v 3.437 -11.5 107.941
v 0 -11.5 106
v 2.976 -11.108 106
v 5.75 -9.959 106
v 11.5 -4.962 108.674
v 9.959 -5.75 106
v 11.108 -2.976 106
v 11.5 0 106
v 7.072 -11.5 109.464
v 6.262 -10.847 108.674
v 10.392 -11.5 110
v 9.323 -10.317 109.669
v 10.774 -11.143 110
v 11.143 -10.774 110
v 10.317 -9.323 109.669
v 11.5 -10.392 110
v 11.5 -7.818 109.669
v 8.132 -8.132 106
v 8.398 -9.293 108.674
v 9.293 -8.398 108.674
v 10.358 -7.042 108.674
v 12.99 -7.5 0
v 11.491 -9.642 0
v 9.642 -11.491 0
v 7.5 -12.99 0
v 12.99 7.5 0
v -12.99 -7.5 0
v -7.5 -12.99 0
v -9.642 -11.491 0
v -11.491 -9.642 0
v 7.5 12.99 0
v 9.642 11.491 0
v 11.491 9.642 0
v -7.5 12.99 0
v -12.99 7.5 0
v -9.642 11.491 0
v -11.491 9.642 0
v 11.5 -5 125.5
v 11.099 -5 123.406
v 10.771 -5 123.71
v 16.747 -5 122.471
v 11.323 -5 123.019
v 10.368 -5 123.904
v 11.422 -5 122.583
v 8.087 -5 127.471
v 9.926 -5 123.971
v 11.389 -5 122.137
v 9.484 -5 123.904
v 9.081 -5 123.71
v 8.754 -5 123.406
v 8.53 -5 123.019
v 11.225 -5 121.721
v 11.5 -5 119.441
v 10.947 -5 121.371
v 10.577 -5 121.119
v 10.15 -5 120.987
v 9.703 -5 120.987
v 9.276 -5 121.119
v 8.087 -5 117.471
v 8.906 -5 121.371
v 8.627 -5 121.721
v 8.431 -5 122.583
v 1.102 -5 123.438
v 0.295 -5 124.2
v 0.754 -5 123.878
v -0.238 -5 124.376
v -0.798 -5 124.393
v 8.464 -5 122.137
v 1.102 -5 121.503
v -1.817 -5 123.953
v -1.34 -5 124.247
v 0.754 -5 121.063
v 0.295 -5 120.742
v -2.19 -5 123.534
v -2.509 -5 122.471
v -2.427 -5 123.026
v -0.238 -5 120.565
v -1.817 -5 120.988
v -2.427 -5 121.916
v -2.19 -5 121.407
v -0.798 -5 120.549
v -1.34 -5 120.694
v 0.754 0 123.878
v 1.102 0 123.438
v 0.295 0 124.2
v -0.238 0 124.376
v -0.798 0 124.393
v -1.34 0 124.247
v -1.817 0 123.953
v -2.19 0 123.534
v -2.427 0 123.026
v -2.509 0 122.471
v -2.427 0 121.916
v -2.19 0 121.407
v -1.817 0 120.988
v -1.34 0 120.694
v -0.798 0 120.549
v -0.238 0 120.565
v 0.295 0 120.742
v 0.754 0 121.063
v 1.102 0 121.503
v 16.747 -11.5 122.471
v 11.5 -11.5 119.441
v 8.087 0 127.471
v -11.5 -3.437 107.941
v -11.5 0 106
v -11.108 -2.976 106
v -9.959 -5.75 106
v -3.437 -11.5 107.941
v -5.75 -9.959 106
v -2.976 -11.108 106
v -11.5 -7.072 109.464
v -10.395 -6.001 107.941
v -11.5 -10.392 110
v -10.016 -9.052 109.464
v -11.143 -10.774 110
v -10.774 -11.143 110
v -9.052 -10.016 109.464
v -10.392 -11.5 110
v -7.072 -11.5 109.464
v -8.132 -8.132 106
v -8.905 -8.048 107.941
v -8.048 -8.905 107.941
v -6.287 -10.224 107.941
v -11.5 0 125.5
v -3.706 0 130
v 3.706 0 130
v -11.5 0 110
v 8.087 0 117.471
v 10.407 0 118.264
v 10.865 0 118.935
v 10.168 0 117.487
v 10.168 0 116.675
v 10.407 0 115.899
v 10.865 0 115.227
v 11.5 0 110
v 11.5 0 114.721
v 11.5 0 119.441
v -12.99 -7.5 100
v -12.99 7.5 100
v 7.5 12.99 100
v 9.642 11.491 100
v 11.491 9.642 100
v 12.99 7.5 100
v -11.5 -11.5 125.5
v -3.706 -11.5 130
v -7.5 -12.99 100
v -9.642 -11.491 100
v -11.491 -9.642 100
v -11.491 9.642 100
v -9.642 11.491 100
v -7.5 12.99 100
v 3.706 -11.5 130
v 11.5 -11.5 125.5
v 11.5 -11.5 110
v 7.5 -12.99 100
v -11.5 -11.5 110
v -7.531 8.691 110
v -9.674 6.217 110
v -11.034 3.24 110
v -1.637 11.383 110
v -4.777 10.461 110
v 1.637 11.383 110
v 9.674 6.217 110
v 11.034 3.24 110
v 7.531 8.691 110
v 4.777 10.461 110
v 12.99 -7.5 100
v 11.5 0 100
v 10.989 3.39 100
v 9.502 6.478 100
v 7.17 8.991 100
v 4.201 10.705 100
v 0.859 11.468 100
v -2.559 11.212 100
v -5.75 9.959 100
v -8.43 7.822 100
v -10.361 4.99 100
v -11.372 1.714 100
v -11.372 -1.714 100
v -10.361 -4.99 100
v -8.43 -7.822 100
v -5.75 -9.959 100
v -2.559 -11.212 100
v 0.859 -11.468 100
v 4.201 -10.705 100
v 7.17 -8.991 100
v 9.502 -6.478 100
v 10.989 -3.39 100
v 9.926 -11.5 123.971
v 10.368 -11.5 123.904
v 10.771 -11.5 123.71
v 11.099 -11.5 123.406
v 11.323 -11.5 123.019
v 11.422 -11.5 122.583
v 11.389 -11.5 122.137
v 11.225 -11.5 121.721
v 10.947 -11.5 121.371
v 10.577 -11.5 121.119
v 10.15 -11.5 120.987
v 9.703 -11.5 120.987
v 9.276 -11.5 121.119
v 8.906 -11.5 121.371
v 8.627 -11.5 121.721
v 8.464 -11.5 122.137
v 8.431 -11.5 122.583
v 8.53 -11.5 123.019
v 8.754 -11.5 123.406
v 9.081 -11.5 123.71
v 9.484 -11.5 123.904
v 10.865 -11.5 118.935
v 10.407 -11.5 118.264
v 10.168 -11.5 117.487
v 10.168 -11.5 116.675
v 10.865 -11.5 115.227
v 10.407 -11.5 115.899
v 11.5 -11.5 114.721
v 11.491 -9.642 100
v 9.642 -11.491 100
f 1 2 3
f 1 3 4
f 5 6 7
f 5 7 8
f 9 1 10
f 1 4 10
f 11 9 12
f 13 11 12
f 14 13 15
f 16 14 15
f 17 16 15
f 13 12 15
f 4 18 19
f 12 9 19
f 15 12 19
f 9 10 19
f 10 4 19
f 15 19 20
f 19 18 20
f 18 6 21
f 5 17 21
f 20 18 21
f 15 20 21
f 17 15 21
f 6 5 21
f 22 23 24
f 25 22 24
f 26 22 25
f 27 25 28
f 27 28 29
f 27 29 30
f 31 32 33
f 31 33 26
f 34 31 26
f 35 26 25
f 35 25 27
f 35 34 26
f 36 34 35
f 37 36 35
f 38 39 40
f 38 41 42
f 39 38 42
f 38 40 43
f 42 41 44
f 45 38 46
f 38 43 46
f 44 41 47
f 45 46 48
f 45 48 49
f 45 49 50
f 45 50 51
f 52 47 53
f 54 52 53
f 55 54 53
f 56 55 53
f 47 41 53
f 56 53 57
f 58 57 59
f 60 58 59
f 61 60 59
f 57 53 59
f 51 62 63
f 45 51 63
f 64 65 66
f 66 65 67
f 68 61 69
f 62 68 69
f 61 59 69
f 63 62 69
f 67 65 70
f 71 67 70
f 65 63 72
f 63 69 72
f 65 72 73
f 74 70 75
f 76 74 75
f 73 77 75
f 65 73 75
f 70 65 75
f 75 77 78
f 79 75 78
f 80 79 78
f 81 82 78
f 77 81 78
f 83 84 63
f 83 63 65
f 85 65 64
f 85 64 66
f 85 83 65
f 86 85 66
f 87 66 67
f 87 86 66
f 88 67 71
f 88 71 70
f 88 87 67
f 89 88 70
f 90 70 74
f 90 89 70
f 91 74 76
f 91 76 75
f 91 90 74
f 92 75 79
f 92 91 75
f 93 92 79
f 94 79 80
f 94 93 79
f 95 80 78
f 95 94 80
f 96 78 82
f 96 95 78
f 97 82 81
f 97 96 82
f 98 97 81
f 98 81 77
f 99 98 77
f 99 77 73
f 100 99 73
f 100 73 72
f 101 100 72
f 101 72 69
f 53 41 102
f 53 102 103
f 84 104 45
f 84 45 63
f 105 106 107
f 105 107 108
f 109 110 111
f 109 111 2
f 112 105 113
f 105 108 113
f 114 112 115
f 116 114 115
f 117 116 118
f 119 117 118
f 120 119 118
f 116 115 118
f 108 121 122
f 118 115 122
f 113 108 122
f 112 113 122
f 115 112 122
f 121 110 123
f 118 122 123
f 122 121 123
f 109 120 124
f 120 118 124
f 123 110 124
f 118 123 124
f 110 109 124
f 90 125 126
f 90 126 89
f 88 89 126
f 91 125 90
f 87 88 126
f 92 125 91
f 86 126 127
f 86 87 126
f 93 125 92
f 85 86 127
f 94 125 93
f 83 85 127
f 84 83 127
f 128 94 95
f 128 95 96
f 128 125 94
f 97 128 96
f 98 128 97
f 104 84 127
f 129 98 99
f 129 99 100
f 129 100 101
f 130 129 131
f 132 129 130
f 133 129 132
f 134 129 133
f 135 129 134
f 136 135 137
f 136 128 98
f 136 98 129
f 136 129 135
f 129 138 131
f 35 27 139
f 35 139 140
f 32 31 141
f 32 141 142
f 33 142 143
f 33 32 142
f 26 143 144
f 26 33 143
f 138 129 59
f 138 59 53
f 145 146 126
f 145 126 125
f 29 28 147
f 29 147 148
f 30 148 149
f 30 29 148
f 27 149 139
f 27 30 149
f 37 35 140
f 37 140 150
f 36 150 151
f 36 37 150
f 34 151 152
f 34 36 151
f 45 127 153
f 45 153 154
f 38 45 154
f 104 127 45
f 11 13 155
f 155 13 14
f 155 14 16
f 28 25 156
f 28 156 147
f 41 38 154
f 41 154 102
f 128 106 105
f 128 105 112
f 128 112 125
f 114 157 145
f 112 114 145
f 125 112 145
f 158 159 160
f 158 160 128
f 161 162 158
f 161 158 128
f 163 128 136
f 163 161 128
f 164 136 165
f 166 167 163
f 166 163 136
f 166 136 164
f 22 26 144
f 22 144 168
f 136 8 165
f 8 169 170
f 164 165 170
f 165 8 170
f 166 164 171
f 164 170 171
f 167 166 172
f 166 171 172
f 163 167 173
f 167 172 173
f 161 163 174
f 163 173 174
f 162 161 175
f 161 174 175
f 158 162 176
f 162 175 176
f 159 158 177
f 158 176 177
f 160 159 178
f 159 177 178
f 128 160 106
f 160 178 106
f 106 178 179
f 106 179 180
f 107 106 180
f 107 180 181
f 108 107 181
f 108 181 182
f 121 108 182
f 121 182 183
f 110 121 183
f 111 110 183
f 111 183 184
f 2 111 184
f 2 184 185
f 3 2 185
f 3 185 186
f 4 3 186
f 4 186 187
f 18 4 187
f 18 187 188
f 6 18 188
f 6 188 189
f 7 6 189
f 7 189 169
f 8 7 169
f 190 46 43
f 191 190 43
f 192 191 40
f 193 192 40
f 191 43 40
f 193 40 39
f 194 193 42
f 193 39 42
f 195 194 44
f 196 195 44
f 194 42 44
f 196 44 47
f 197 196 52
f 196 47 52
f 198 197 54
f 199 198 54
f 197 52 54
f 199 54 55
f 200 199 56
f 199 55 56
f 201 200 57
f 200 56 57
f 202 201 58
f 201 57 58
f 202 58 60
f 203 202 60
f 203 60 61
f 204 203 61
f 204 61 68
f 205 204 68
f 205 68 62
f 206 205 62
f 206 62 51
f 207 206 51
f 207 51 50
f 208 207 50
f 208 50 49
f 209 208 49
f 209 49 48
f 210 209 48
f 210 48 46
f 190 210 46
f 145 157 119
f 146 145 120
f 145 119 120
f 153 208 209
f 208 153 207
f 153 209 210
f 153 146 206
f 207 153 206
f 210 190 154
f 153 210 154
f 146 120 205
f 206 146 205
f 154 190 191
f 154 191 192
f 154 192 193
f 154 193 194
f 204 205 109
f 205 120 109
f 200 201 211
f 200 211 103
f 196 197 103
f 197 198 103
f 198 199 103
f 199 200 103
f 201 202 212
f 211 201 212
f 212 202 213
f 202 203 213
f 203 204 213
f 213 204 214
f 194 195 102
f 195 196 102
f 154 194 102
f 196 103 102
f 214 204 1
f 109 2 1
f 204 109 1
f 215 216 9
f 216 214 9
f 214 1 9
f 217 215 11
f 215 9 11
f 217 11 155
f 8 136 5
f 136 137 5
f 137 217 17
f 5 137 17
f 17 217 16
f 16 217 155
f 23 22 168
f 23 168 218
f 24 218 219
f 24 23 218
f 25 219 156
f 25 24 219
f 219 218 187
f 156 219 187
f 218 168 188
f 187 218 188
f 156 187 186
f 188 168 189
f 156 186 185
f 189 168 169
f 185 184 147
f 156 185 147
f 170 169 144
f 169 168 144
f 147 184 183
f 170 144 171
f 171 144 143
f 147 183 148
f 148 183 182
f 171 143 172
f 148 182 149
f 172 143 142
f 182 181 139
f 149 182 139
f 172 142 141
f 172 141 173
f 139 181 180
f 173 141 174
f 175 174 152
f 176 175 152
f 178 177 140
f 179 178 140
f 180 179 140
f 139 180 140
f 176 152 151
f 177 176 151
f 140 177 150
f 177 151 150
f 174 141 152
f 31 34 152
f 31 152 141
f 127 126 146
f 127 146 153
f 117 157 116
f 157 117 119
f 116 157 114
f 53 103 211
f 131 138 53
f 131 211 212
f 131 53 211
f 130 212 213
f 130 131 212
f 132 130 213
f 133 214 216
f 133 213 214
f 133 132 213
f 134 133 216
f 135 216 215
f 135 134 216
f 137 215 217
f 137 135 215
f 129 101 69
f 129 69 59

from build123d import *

# Parameters (mm, degrees)
EXTRUDE_1_DEPTH     = 100
SKETCH_2_R          = 11.5
EXTRUDE_2_DEPTH     = 10
SKETCH_3_W          = 23
SKETCH_3_H          = 11.5
EXTRUDE_3_DEPTH     = 20
FILLET_3_R          = 4
FILLET_4_R          = 4
CUT_EXTRUDE_1_DEPTH = 132.291660154
EXTRUDE_4_DEPTH     = 11.5
CUT_EXTRUDE_2_DEPTH = 20
CUT_EXTRUDE_3_DEPTH = 5
SKETCH_8_R          = 1.5
CUT_EXTRUDE_4_DEPTH = 133.303102986


with BuildPart() as part:
    # 草图1 → 凸台-拉伸1 (new body)
    with BuildSketch(Plane.XY):
        with BuildLine():
            Line((-7.5, 12.990381057), (7.5, 12.990381057))
            ThreePointArc((7.5, 12.990381057), (10.606601718, 10.606601718), (12.990381057, 7.5))
            Line((12.990381057, 7.5), (12.990381057, -7.5))
            ThreePointArc((12.990381057, -7.5), (10.606601718, -10.606601718), (7.5, -12.990381057))
            Line((7.5, -12.990381057), (-7.5, -12.990381057))
            ThreePointArc((-7.5, -12.990381057), (-10.606601718, -10.606601718), (-12.990381057, -7.5))
            Line((-12.990381057, -7.5), (-12.990381057, 7.5))
            ThreePointArc((-12.990381057, 7.5), (-10.606601718, 10.606601718), (-7.5, 12.990381057))
        make_face()
    extrude(amount=EXTRUDE_1_DEPTH)

    # 草图2 → 凸台-拉伸2 (add)
    with BuildSketch(Plane.XY.offset(100)):
        Circle(SKETCH_2_R)
    extrude(amount=EXTRUDE_2_DEPTH)

    # 草图3 → 凸台-拉伸3 (add)
    with BuildSketch(Plane.XY.offset(110)):
        with Locations((0, -5.75)):
            Rectangle(SKETCH_3_W, SKETCH_3_H)
    extrude(amount=EXTRUDE_3_DEPTH)

    # 圆角3
    # the kernel refuses this fillet: 4 mm, written as the material it adds along each edge
    with BuildSketch(Plane(origin=(0, 0, 110), x_dir=(0, -1, 0), z_dir=(-1, 0, 0))) as fillet_3_piece_1_section:
        with BuildLine():
            CenterArc((11.5 + FILLET_3_R, -FILLET_3_R), FILLET_3_R, 90, 90)
            Line((11.5 + FILLET_3_R, 0), (11.5, 0))
            Line((11.5, 0), (11.5, -FILLET_3_R))
        make_face()
    fillet_3_piece_1 = revolve(axis=Axis((0, 0, 110), (0, 0, 1)), revolution_arc=90, mode=Mode.PRIVATE)
    fillet_3_piece_1 = split(fillet_3_piece_1, bisect_by=Plane(origin=(8.245599316, -11.5, 108.963397676), z_dir=(0, 1, 0)), keep=Keep.TOP, mode=Mode.PRIVATE)
    fillet_3_piece_1 = split(fillet_3_piece_1, bisect_by=Plane(origin=(11.5, -8.245600634, 108.963397676), z_dir=(-1, 0, 0)), keep=Keep.TOP, mode=Mode.PRIVATE)
    add(fillet_3_piece_1)

    # 圆角4
    # the kernel refuses this fillet: 4 mm, written as the material it adds along each edge
    with BuildSketch(Plane(origin=(0, 0, 110), x_dir=(-1, 0, 0), z_dir=(0, 1, 0))) as fillet_4_piece_1_section:
        with BuildLine():
            CenterArc((11.5 + FILLET_4_R, -FILLET_4_R), FILLET_4_R, 90, 90)
            Line((11.5 + FILLET_4_R, 0), (11.5, 0))
            Line((11.5, 0), (11.5, -FILLET_4_R))
        make_face()
    fillet_4_piece_1 = revolve(axis=Axis((0, 0, 110), (0, 0, 1)), revolution_arc=139.842431039, mode=Mode.PRIVATE)
    fillet_4_piece_1 = split(fillet_4_piece_1, bisect_by=Plane(origin=(-8.245600113, -11.5, 108.963397741), z_dir=(0, 1, 0)), keep=Keep.TOP, mode=Mode.PRIVATE)
    fillet_4_piece_1 = split(fillet_4_piece_1, bisect_by=Plane(origin=(11.5, -8.245601202, 108.963397741), z_dir=(-1, 0, 0)), keep=Keep.TOP, mode=Mode.PRIVATE)
    fillet_4_piece_1 = split(fillet_4_piece_1, bisect_by=Plane(origin=(-11.5, -8.245601202, 108.963397741), z_dir=(1, 0, 0)), keep=Keep.TOP, mode=Mode.PRIVATE)
    add(fillet_4_piece_1)

    # 草图4 → 切除-拉伸1 (cut, through all)
    with BuildSketch(Plane(origin=(0, 0, 0), x_dir=(1, 0, 0), z_dir=(0, 1, 0))):
        Polygon((3.705771366, -130), (11.5, -125.5), (11.5, -130), align=None)
        Polygon((-11.5, -130), (-3.705771366, -130), (-11.5, -125.5), align=None)
    extrude(amount=-CUT_EXTRUDE_1_DEPTH, mode=Mode.SUBTRACT)

    # 草图5 → 凸台-拉伸4 (add)
    with BuildSketch(Plane(origin=(0, 0, 0), x_dir=(1, 0, 0), z_dir=(0, 1, 0))):
        Polygon((11.5, -125.5), (16.746857011, -122.470725692), (11.5, -119.441451384), align=None)
    extrude(amount=-EXTRUDE_4_DEPTH)

    # 草图6 → 切除-拉伸2 (cut)
    with BuildSketch(Plane(origin=(0, 0, 0), x_dir=(1, 0, 0), z_dir=(0, 1, 0))):
        with BuildLine():
            Line((11.5, -114.720725692), (11.5, -119.441451384))
            ThreePointArc((11.5, -119.441451384), (10.137243875, -117.081088538), (11.5, -114.720725692))
        make_face()
    extrude(amount=-CUT_EXTRUDE_2_DEPTH, mode=Mode.SUBTRACT)

    # 草图7 → 切除-拉伸3 (cut)
    with BuildSketch(Plane(origin=(0, 0, 0), x_dir=(1, 0, 0), z_dir=(0, 1, 0))):
        with BuildLine():
            Line((16.746857011, -122.470725692), (8.086602973, -127.470725692))
            Line((8.086602973, -127.470725692), (1.102060707, -123.438198334))
            ThreePointArc((1.102060707, -123.438198334), (-2.508596349, -122.470725692), (1.102060707, -121.50325305))
            Line((1.102060707, -121.50325305), (8.086602973, -117.470725692))
            Line((8.086602973, -117.470725692), (16.746857011, -122.470725692))
        make_face()
    extrude(amount=-CUT_EXTRUDE_3_DEPTH, mode=Mode.SUBTRACT)

    # 草图8 → 切除-拉伸4 (cut, through all)
    with BuildSketch(Plane(origin=(0, -5, 0), x_dir=(1, 0, 0), z_dir=(0, 1, 0))):
        with Locations(Location((9.926348936, -122.470725692, 0), (0, 0, 270))):
            Circle(SKETCH_8_R)
    extrude(amount=-CUT_EXTRUDE_4_DEPTH, mode=Mode.SUBTRACT)


solid = part.part
